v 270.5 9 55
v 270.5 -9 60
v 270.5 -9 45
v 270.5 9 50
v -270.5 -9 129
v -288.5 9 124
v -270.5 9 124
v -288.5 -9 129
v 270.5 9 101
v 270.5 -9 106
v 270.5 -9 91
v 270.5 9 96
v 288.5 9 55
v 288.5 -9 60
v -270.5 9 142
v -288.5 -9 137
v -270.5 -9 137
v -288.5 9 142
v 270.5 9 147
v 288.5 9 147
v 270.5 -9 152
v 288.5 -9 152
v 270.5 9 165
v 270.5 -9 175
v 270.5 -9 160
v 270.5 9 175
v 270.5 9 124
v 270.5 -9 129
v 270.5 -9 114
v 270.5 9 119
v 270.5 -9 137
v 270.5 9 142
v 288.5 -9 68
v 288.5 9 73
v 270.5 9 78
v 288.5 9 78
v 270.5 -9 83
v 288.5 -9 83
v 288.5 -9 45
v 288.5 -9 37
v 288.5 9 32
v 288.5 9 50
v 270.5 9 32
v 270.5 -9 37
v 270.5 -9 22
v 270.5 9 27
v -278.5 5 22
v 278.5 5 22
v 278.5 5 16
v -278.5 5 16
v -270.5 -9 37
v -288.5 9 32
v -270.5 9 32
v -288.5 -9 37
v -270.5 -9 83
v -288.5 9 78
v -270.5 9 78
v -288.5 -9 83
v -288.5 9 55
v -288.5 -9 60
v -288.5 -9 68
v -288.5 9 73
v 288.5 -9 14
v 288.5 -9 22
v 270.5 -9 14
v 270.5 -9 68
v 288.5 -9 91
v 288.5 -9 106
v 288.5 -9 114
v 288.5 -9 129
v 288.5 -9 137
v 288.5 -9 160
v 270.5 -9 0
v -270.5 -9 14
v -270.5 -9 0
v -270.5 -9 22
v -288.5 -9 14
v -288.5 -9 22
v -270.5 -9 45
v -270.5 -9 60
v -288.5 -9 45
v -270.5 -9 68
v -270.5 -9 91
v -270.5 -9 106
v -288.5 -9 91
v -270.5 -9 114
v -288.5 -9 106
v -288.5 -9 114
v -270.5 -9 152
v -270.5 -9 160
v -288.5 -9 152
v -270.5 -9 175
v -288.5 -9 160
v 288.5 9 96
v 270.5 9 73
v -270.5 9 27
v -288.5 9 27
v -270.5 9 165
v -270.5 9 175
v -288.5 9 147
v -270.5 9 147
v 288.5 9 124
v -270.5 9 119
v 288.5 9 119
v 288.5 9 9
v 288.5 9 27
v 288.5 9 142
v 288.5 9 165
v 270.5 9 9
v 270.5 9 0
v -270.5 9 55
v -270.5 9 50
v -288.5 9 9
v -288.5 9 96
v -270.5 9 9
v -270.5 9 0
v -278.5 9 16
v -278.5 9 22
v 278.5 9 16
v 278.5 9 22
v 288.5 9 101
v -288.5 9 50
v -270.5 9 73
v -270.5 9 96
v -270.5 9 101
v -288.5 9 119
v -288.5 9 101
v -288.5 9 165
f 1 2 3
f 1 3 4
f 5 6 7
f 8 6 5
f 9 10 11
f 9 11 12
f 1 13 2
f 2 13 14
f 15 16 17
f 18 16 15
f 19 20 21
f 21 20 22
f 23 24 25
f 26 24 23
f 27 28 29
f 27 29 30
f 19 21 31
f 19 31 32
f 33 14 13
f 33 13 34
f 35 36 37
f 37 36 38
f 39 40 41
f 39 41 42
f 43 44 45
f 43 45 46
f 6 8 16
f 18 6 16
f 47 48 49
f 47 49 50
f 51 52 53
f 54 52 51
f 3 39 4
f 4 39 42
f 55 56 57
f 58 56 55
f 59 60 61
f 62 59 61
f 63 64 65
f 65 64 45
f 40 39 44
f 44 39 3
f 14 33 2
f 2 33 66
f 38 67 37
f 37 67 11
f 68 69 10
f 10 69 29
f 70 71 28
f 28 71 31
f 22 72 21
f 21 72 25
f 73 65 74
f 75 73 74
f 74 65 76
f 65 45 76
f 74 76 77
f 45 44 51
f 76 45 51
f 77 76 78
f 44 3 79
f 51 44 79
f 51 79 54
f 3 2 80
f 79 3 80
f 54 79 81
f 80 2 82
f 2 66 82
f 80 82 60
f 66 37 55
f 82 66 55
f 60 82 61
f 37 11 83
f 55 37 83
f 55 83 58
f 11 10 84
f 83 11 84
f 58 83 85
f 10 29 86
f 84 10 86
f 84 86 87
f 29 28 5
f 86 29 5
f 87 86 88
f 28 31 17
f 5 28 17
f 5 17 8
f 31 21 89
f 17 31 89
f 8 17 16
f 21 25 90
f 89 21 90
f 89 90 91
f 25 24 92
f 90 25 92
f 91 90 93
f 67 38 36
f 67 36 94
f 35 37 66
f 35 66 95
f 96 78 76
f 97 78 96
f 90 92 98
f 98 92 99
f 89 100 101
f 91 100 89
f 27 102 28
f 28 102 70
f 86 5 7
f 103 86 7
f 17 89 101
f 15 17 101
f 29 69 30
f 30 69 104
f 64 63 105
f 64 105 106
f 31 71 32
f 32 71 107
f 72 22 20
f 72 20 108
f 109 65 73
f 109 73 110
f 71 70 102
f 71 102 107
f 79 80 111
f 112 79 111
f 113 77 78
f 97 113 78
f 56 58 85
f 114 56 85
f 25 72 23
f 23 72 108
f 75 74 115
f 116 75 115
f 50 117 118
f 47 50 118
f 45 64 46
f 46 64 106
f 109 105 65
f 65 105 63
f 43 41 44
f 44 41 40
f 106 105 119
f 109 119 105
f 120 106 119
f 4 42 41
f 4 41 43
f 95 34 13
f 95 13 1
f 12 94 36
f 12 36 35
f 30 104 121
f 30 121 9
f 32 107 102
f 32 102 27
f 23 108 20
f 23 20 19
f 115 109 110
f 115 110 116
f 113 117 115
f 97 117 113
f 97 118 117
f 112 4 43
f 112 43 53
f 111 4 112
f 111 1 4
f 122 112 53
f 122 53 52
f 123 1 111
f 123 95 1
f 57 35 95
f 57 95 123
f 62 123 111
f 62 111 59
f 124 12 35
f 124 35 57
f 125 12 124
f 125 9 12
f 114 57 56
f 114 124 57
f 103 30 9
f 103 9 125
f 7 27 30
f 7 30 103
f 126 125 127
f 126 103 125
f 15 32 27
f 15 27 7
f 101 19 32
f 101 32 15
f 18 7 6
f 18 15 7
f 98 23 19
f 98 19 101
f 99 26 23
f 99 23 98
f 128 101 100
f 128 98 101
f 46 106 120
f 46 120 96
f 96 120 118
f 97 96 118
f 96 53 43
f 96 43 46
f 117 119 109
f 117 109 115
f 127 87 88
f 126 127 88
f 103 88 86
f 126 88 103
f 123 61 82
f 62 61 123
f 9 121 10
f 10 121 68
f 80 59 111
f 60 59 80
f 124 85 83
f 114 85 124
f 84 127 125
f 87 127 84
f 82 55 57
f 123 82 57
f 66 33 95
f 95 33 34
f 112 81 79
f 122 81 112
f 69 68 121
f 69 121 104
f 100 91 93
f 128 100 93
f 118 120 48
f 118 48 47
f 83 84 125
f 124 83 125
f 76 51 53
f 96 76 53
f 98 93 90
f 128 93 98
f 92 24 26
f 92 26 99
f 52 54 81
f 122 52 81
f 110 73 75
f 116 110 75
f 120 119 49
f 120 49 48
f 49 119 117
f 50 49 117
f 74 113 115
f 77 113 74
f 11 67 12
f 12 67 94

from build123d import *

# Parameters (mm, degrees)
F0_W     = 288.5
F0_H     = 175
F1_DEPTH = 9
F3_DEPTH = 18
F5_W     = 557
F5_H     = 6
F6_DEPTH = 4


with BuildPart() as f1:
    # F0 (on Front) → F1 (new body, symmetric)
    with BuildSketch(Plane.XZ):
        with Locations((144.25, 87.5)):
            Rectangle(F0_W, F0_H)
    extrude(amount=F1_DEPTH, both=True)

    # F2 (on face) → F3 (cut)
    with BuildSketch(Plane.YZ.offset(288.5)):
        Polygon((-9, 175), (-9, 160), (9, 165), (9, 175), align=None)
        Polygon((9, 147), (-9, 152), (-9, 137), (9, 142), align=None)
        Polygon((9, 101), (-9, 106), (-9, 91), (9, 96), align=None)
        Polygon((9, 78), (-9, 83), (-9, 68), (9, 73), align=None)
        Polygon((9, 55), (-9, 60), (-9, 45), (9, 50), align=None)
        Polygon((9, 32), (-9, 37), (-9, 22), (9, 27), align=None)
        Polygon((9, 9), (-9, 14), (-9, 0), (9, 0), align=None)
        Polygon((9, 124), (-9, 129), (-9, 114), (9, 119), align=None)
    extrude(amount=-F3_DEPTH, mode=Mode.SUBTRACT)

    # F4: F1 across plane


with BuildPart() as f1_1:
    add(f1.part)
    add(f1.part.mirror(Plane.YZ))

    # F5 (on face) → F6 (cut)
    with BuildSketch(Plane(origin=(0, 9, 0), x_dir=(-1, 0, 0), z_dir=(0, 1, 0))):
        with Locations((0, 19)):
            Rectangle(F5_W, F5_H)
    extrude(amount=-F6_DEPTH, mode=Mode.SUBTRACT)


solid = f1_1.part
